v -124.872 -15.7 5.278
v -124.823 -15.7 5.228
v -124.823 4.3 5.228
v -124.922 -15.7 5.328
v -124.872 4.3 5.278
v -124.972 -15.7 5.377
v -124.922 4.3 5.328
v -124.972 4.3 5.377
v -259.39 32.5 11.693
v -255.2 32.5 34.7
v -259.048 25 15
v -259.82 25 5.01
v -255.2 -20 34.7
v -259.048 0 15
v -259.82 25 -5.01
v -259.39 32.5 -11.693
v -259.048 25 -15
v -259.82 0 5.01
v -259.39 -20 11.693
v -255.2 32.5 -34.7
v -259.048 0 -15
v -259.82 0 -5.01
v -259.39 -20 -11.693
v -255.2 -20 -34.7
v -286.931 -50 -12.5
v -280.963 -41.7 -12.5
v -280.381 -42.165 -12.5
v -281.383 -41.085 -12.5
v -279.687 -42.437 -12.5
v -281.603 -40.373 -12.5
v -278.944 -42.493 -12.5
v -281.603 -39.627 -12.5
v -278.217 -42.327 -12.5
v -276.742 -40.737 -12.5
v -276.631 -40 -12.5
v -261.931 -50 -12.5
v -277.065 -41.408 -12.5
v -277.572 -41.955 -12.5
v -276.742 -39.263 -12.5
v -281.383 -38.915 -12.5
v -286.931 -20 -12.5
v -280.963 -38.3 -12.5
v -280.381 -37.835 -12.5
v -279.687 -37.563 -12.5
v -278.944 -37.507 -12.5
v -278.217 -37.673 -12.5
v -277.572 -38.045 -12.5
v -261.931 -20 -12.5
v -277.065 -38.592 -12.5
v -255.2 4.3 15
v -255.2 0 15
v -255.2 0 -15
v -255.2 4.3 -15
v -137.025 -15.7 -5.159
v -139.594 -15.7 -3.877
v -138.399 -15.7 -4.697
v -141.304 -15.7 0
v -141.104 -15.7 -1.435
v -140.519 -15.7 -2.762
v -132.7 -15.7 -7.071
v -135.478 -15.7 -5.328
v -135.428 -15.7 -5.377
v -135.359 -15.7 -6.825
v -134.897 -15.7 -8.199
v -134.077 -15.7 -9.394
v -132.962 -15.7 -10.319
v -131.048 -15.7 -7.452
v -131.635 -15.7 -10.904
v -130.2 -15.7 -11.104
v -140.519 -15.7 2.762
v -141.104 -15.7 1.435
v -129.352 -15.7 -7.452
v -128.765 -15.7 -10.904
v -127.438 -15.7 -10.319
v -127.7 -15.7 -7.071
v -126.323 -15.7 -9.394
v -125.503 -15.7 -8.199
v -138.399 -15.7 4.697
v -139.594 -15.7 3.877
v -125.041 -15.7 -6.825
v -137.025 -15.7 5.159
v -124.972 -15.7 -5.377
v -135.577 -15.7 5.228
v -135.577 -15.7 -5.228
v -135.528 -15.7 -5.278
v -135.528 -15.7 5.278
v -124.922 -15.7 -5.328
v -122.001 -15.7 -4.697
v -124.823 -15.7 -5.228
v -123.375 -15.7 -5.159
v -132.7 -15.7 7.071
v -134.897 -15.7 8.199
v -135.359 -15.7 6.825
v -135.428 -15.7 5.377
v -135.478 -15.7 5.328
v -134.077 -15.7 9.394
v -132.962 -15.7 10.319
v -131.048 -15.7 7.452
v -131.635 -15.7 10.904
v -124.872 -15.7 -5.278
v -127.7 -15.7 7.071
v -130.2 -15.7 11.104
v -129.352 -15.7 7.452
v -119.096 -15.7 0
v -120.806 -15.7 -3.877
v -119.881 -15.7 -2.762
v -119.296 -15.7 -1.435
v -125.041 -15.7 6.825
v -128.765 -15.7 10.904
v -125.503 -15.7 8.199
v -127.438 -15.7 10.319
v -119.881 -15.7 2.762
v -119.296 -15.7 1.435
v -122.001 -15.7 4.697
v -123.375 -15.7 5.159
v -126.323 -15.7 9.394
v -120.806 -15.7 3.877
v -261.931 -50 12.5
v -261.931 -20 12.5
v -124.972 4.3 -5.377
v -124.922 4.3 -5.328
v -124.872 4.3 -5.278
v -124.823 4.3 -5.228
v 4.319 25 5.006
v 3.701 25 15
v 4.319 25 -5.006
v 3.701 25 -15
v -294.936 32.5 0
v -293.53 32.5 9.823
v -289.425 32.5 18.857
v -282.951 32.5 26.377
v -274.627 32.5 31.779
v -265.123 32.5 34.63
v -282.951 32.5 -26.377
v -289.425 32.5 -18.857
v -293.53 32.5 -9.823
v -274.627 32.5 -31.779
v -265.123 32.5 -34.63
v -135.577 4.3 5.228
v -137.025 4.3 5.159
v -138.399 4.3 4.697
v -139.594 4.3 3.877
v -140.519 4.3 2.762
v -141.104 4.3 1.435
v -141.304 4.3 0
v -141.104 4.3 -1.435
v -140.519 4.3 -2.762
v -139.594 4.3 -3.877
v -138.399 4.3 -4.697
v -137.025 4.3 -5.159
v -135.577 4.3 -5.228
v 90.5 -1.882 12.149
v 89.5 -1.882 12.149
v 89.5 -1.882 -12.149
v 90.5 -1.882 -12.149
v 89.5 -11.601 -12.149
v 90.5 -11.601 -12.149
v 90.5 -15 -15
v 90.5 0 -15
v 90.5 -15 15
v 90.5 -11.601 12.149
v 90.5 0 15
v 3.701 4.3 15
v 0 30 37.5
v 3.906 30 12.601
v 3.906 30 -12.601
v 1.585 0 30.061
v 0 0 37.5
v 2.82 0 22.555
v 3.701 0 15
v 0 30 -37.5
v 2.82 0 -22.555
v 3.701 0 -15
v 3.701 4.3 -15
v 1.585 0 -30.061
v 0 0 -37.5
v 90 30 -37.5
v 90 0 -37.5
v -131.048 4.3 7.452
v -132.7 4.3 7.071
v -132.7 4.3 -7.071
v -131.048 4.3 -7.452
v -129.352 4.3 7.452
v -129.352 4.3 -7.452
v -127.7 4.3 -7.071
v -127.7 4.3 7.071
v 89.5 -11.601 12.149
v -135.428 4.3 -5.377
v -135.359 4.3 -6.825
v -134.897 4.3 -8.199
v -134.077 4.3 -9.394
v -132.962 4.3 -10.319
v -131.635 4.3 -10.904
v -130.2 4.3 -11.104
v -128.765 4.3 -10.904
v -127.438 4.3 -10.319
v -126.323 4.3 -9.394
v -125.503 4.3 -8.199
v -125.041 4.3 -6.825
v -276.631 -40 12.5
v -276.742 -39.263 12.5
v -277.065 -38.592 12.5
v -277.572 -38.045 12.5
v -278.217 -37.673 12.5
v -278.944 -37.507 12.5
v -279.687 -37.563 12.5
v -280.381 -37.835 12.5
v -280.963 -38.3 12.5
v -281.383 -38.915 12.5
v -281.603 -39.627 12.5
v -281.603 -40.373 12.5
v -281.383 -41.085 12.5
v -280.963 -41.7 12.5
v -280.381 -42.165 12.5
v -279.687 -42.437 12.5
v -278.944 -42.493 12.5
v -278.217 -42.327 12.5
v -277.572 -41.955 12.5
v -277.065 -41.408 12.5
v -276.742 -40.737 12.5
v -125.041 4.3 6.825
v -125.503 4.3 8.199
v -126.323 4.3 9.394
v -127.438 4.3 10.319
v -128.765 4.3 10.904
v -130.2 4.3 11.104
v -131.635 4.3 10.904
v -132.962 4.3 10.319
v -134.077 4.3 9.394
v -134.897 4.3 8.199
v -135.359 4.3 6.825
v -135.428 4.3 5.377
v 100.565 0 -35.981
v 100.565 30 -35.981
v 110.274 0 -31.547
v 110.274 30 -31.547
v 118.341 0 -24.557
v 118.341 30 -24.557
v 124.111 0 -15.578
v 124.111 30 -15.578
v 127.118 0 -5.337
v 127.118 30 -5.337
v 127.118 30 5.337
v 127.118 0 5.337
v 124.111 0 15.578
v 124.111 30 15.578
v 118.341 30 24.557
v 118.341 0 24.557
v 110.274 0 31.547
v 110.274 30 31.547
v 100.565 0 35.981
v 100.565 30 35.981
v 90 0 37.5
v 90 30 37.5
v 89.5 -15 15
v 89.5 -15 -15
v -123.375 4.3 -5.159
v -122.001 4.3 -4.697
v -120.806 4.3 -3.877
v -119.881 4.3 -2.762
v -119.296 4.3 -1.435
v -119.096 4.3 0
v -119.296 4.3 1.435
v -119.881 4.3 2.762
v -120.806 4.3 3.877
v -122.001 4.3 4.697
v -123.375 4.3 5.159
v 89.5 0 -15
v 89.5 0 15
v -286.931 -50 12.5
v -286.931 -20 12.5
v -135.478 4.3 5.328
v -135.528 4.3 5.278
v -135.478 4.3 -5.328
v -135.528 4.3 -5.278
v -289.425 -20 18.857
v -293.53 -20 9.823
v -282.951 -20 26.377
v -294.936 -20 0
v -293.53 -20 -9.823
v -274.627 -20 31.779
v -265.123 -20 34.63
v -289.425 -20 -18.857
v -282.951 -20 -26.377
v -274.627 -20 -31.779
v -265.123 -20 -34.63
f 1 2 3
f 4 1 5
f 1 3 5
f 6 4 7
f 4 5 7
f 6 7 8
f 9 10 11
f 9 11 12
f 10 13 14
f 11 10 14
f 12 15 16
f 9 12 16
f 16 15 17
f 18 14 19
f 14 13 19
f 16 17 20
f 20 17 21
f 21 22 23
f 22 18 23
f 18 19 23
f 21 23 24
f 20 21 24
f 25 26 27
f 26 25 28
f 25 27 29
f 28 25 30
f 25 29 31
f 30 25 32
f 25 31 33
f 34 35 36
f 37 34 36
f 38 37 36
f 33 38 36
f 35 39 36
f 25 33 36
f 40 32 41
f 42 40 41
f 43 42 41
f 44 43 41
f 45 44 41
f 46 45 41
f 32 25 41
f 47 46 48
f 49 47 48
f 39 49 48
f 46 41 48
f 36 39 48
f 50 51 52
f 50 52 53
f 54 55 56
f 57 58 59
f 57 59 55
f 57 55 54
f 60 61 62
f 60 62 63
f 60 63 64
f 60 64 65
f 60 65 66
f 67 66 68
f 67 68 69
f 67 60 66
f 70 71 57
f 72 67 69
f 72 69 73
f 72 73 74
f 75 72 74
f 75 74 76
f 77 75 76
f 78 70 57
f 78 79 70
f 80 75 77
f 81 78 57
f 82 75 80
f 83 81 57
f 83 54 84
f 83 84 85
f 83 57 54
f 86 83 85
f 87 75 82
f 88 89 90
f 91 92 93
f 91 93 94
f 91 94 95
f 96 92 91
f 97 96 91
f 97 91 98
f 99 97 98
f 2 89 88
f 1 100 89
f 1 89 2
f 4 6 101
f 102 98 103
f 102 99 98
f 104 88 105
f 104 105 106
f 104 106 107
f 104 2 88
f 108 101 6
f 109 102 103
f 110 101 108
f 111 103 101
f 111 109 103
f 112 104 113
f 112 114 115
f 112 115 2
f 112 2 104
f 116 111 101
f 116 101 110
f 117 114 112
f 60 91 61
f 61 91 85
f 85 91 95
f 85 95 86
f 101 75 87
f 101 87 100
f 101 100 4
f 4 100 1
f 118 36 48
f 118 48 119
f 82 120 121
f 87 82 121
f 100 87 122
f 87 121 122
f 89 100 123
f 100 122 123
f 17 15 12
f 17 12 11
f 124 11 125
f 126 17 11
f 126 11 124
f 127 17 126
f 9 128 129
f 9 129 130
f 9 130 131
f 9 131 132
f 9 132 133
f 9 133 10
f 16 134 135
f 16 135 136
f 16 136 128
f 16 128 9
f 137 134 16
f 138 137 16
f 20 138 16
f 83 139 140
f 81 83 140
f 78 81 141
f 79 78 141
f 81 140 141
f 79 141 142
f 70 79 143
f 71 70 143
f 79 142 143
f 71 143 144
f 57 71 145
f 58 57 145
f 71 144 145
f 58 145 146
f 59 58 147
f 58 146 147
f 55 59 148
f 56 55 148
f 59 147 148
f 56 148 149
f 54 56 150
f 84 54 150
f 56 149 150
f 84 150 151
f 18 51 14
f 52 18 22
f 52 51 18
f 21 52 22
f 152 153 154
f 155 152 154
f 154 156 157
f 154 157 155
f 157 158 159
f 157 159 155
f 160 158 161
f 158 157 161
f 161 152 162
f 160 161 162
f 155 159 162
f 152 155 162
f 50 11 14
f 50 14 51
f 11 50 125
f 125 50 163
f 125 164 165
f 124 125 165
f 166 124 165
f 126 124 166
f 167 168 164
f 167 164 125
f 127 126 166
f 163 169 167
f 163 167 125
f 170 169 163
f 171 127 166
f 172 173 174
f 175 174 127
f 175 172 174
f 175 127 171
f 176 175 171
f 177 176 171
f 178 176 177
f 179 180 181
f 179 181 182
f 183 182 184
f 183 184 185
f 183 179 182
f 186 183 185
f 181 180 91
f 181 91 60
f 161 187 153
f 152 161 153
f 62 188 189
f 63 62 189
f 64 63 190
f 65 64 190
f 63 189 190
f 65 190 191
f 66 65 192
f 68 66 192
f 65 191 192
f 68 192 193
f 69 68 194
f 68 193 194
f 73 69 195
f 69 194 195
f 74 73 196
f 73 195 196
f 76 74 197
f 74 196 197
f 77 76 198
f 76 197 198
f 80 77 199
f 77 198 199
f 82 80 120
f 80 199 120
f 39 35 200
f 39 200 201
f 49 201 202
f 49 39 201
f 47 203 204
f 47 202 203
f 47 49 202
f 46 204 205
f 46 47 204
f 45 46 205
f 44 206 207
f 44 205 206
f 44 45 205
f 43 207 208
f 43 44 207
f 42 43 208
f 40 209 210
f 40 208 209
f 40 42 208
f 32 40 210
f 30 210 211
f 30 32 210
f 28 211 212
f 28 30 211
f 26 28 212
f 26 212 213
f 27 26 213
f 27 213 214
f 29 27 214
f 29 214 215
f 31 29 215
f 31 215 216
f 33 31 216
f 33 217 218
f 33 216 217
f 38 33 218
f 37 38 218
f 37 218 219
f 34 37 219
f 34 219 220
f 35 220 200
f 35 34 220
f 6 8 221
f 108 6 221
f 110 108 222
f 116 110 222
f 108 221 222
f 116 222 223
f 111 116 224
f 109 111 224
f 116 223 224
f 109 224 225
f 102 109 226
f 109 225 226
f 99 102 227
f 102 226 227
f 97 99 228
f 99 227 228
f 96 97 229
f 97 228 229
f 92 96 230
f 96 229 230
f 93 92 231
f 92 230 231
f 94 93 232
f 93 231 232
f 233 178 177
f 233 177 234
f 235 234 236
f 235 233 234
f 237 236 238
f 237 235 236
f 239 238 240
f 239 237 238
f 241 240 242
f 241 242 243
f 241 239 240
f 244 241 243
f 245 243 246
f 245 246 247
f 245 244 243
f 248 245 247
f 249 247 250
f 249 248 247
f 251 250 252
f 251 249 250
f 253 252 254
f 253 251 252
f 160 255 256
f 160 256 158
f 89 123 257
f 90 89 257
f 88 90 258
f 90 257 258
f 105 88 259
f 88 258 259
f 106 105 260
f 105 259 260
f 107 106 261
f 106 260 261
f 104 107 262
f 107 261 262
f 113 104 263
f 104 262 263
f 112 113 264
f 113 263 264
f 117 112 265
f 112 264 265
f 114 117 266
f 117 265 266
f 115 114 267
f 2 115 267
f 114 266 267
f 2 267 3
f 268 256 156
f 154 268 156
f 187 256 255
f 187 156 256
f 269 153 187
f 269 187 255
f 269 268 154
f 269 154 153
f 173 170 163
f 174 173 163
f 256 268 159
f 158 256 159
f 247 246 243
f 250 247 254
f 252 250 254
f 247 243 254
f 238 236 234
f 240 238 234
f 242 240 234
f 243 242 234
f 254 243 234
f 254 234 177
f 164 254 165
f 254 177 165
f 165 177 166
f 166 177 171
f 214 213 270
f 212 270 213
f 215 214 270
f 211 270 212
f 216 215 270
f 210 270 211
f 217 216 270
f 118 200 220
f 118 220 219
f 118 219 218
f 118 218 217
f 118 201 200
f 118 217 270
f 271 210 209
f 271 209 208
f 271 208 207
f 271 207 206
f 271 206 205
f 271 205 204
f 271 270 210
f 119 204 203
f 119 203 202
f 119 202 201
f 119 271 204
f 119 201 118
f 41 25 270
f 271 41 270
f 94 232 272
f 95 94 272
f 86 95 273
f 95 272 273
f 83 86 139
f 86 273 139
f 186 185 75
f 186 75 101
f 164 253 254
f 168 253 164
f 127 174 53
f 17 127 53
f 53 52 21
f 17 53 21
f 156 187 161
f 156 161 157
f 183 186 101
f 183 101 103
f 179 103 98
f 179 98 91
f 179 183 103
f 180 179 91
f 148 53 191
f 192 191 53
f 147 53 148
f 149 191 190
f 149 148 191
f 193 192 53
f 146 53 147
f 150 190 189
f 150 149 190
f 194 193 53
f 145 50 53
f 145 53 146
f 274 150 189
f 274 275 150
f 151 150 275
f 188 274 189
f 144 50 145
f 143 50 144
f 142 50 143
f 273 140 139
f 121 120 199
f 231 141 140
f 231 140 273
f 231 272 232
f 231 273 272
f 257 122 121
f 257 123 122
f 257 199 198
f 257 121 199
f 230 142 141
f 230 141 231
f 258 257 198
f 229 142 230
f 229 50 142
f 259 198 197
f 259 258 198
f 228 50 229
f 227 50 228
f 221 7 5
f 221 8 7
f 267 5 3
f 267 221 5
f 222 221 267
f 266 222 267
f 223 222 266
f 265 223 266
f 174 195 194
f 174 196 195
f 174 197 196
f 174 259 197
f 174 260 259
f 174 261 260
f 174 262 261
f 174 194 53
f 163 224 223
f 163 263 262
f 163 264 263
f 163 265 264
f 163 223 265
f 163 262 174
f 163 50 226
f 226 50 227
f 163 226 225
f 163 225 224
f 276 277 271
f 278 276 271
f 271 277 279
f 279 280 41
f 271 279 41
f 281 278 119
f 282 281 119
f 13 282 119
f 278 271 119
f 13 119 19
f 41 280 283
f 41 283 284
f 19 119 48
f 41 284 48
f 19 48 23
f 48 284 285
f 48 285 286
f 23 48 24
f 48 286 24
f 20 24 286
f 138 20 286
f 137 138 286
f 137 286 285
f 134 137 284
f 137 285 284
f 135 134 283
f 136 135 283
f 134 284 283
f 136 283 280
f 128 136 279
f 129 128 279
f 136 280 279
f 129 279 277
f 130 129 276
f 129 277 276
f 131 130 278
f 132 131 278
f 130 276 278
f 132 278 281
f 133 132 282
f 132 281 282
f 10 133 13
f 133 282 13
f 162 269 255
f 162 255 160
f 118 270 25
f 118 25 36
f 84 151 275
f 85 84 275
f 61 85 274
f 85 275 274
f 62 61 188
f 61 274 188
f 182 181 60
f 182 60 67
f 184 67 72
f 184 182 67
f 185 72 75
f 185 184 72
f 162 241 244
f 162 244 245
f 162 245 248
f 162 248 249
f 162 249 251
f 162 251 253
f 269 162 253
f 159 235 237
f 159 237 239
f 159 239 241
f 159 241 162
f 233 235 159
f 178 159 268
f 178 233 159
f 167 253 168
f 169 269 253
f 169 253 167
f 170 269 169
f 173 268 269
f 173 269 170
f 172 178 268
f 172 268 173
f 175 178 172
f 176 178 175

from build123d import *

# Parameters (mm, degrees)
BOSS_EXTRUDE1_DEPTH      = 32.5
BOSS_EXTRUDE1_DEPTH_BACK = 20
BOSS_EXTRUDE2_DEPTH      = 30
BOSS_EXTRUDE4_DEPTH      = 25
SKETCH2_W                = 25
SKETCH2_H                = 25
BOSS_EXTRUDE5_DEPTH      = 30
CUT_EXTRUDE1_DEPTH       = 304.293772711
CUT_EXTRUDE1_DEPTH_BACK  = 304.293772711
SKETCH3_R                = 2.5
SKETCH4_W                = 1
SKETCH4_H                = 30
BOSS_EXTRUDE6_DEPTH      = 15
CUT_EXTRUDE2_DEPTH       = 2
CUT_EXTRUDE2_DEPTH_BACK  = 5
SKETCH5_W                = 24.298824304
SKETCH5_H                = 9.719529722
CUT_EXTRUDE3_REACH       = 305.716
SKETCH6_W                = 258.900724606
SKETCH6_H                = 4.300489871
BOSS_EXTRUDE7_DEPTH      = 20


with BuildPart() as part:
    # Sketch1 → Boss-Extrude1 (new, two sides: drawn at the far end of the back side and taken through both)
    with BuildSketch(Plane(origin=(0, 0, 0), x_dir=(1, 0, 0), z_dir=(0, 1, 0)).offset(-BOSS_EXTRUDE1_DEPTH_BACK)):
        with BuildLine():
            ThreePointArc((-255.2, -34.7), (-259.916681078, 0), (-255.2, 34.7))
            ThreePointArc((-255.2, 34.7), (-294.935777018, 0), (-255.2, -34.7))
        make_face()
    extrude(amount=BOSS_EXTRUDE1_DEPTH + BOSS_EXTRUDE1_DEPTH_BACK)



with BuildPart() as body_2:
    # Sketch1<3> → Boss-Extrude2 (new body)
    with BuildSketch(Plane(origin=(0, 0, 0), x_dir=(1, 0, 0), z_dir=(0, 1, 0))):
        with BuildLine():
            ThreePointArc((0, -37.5), (4.396048304, 0), (0, 37.5))
            Line((0, 37.5), (90, 37.5))
            ThreePointArc((90, 37.5), (127.5, 0), (90, -37.5))
            Line((90, -37.5), (0, -37.5))
        make_face()
    extrude(amount=BOSS_EXTRUDE2_DEPTH)


with BuildPart() as part_1:
    add(part.part)

    add(body_2.part)  # Boss-Extrude4 merges body 2
    # Sketch1<5> → Boss-Extrude4 (add)
    with BuildSketch(Plane(origin=(0, 0, 0), x_dir=(1, 0, 0), z_dir=(0, 1, 0))):
        with BuildLine():
            ThreePointArc((3.700724606, -15), (4.396048304, 0), (3.700724606, 15))
            Line((3.700724606, 15), (-259.04839678, 15))
            ThreePointArc((-259.04839678, 15), (-259.916681078, 0), (-259.04839678, -15))
            Line((-259.04839678, -15), (3.700724606, -15))
        make_face()
    extrude(amount=BOSS_EXTRUDE4_DEPTH)

    # Sketch2 → Boss-Extrude5 (add)
    with BuildSketch(Plane.XZ.offset(20)):
        with Locations((-274.43065957, 0)):
            Rectangle(SKETCH2_W, SKETCH2_H)
    extrude(amount=BOSS_EXTRUDE5_DEPTH)

    # Sketch3 → Cut-Extrude1 (cut, two sides: drawn at the far end of the back side and taken through both)
    with BuildSketch(Plane.XY.offset(12.5).offset(-CUT_EXTRUDE1_DEPTH_BACK)):
        with Locations((-279.13065957, -40)):
            Circle(SKETCH3_R)
    extrude(amount=CUT_EXTRUDE1_DEPTH + CUT_EXTRUDE1_DEPTH_BACK, mode=Mode.SUBTRACT)

    # Sketch4 → Boss-Extrude6 (add)
    with BuildSketch(Plane.XZ):
        with Locations((90, 0)):
            Rectangle(SKETCH4_W, SKETCH4_H)
    extrude(amount=BOSS_EXTRUDE6_DEPTH)

    # Sketch5 → Cut-Extrude2 (cut, two sides: drawn at the far end of the back side and taken through both)
    with BuildSketch(Plane(origin=(90.5, 0, 0), x_dir=(0, 0, -1), z_dir=(1, 0, 0)).offset(-CUT_EXTRUDE2_DEPTH_BACK)):
        with Locations((0, -6.741495989)):
            Rectangle(SKETCH5_W, SKETCH5_H)
    extrude(amount=CUT_EXTRUDE2_DEPTH + CUT_EXTRUDE2_DEPTH_BACK, mode=Mode.SUBTRACT)

    # Cut-Extrude3: up to this face of the body (flat: up to its plane)
    cut_extrude3_end = Plane(part_1.part.faces().sort_by_distance((-127.673836087, 12.5, -15))[0])
    # Sketch6 → Cut-Extrude3 (cut, up to the picked face)
    with BuildSketch(Plane.XY.offset(15), mode=Mode.PRIVATE) as cut_extrude3_sk1:
        with Locations((-125.749637697, 2.150244935)):
            Rectangle(SKETCH6_W, SKETCH6_H)
    cut_extrude3_tool1 = split(extrude(cut_extrude3_sk1.sketch, amount=-CUT_EXTRUDE3_REACH, mode=Mode.PRIVATE), bisect_by=cut_extrude3_end, keep=Keep.BOTH, mode=Mode.PRIVATE)
    add(cut_extrude3_tool1.solids().sort_by(Axis((-125.749638, 2.150245, 15), (0, 0, -1)))[0], mode=Mode.SUBTRACT)

    # Sketch7 → Boss-Extrude7 (add)
    with BuildSketch(Plane.XZ.offset(-4.300489871)):
        with BuildLine():
            ThreePointArc((-124.971686685, -5.377242777), (-124.896699141, -5.303300859), (-124.822757223, -5.228313315))
            ThreePointArc((-124.822757223, -5.228313315), (-119.096060376, 0), (-124.822757223, 5.228313315))
            ThreePointArc((-124.822757223, 5.228313315), (-124.896699141, 5.303300859), (-124.971686685, 5.377242777))
            ThreePointArc((-124.971686685, 5.377242777), (-130.2, 11.103939624), (-135.428313315, 5.377242777))
            ThreePointArc((-135.428313315, 5.377242777), (-135.503300859, 5.303300859), (-135.577242777, 5.228313315))
            ThreePointArc((-135.577242777, 5.228313315), (-141.303939624, 0), (-135.577242777, -5.228313315))
            ThreePointArc((-135.577242777, -5.228313315), (-135.503300859, -5.303300859), (-135.428313315, -5.377242777))
            ThreePointArc((-135.428313315, -5.377242777), (-130.2, -11.103939624), (-124.971686685, -5.377242777))
        make_face()
        with BuildLine():
            Line((-132.7, 7.071067812), (-132.7, -7.071067812))
            ThreePointArc((-132.7, -7.071067812), (-130.2, -7.5), (-127.7, -7.071067812))
            Line((-127.7, -7.071067812), (-127.7, 7.071067812))
            ThreePointArc((-127.7, 7.071067812), (-130.2, 7.5), (-132.7, 7.071067812))
        make_face(mode=Mode.SUBTRACT)
    extrude(amount=BOSS_EXTRUDE7_DEPTH)


solid = part_1.part
